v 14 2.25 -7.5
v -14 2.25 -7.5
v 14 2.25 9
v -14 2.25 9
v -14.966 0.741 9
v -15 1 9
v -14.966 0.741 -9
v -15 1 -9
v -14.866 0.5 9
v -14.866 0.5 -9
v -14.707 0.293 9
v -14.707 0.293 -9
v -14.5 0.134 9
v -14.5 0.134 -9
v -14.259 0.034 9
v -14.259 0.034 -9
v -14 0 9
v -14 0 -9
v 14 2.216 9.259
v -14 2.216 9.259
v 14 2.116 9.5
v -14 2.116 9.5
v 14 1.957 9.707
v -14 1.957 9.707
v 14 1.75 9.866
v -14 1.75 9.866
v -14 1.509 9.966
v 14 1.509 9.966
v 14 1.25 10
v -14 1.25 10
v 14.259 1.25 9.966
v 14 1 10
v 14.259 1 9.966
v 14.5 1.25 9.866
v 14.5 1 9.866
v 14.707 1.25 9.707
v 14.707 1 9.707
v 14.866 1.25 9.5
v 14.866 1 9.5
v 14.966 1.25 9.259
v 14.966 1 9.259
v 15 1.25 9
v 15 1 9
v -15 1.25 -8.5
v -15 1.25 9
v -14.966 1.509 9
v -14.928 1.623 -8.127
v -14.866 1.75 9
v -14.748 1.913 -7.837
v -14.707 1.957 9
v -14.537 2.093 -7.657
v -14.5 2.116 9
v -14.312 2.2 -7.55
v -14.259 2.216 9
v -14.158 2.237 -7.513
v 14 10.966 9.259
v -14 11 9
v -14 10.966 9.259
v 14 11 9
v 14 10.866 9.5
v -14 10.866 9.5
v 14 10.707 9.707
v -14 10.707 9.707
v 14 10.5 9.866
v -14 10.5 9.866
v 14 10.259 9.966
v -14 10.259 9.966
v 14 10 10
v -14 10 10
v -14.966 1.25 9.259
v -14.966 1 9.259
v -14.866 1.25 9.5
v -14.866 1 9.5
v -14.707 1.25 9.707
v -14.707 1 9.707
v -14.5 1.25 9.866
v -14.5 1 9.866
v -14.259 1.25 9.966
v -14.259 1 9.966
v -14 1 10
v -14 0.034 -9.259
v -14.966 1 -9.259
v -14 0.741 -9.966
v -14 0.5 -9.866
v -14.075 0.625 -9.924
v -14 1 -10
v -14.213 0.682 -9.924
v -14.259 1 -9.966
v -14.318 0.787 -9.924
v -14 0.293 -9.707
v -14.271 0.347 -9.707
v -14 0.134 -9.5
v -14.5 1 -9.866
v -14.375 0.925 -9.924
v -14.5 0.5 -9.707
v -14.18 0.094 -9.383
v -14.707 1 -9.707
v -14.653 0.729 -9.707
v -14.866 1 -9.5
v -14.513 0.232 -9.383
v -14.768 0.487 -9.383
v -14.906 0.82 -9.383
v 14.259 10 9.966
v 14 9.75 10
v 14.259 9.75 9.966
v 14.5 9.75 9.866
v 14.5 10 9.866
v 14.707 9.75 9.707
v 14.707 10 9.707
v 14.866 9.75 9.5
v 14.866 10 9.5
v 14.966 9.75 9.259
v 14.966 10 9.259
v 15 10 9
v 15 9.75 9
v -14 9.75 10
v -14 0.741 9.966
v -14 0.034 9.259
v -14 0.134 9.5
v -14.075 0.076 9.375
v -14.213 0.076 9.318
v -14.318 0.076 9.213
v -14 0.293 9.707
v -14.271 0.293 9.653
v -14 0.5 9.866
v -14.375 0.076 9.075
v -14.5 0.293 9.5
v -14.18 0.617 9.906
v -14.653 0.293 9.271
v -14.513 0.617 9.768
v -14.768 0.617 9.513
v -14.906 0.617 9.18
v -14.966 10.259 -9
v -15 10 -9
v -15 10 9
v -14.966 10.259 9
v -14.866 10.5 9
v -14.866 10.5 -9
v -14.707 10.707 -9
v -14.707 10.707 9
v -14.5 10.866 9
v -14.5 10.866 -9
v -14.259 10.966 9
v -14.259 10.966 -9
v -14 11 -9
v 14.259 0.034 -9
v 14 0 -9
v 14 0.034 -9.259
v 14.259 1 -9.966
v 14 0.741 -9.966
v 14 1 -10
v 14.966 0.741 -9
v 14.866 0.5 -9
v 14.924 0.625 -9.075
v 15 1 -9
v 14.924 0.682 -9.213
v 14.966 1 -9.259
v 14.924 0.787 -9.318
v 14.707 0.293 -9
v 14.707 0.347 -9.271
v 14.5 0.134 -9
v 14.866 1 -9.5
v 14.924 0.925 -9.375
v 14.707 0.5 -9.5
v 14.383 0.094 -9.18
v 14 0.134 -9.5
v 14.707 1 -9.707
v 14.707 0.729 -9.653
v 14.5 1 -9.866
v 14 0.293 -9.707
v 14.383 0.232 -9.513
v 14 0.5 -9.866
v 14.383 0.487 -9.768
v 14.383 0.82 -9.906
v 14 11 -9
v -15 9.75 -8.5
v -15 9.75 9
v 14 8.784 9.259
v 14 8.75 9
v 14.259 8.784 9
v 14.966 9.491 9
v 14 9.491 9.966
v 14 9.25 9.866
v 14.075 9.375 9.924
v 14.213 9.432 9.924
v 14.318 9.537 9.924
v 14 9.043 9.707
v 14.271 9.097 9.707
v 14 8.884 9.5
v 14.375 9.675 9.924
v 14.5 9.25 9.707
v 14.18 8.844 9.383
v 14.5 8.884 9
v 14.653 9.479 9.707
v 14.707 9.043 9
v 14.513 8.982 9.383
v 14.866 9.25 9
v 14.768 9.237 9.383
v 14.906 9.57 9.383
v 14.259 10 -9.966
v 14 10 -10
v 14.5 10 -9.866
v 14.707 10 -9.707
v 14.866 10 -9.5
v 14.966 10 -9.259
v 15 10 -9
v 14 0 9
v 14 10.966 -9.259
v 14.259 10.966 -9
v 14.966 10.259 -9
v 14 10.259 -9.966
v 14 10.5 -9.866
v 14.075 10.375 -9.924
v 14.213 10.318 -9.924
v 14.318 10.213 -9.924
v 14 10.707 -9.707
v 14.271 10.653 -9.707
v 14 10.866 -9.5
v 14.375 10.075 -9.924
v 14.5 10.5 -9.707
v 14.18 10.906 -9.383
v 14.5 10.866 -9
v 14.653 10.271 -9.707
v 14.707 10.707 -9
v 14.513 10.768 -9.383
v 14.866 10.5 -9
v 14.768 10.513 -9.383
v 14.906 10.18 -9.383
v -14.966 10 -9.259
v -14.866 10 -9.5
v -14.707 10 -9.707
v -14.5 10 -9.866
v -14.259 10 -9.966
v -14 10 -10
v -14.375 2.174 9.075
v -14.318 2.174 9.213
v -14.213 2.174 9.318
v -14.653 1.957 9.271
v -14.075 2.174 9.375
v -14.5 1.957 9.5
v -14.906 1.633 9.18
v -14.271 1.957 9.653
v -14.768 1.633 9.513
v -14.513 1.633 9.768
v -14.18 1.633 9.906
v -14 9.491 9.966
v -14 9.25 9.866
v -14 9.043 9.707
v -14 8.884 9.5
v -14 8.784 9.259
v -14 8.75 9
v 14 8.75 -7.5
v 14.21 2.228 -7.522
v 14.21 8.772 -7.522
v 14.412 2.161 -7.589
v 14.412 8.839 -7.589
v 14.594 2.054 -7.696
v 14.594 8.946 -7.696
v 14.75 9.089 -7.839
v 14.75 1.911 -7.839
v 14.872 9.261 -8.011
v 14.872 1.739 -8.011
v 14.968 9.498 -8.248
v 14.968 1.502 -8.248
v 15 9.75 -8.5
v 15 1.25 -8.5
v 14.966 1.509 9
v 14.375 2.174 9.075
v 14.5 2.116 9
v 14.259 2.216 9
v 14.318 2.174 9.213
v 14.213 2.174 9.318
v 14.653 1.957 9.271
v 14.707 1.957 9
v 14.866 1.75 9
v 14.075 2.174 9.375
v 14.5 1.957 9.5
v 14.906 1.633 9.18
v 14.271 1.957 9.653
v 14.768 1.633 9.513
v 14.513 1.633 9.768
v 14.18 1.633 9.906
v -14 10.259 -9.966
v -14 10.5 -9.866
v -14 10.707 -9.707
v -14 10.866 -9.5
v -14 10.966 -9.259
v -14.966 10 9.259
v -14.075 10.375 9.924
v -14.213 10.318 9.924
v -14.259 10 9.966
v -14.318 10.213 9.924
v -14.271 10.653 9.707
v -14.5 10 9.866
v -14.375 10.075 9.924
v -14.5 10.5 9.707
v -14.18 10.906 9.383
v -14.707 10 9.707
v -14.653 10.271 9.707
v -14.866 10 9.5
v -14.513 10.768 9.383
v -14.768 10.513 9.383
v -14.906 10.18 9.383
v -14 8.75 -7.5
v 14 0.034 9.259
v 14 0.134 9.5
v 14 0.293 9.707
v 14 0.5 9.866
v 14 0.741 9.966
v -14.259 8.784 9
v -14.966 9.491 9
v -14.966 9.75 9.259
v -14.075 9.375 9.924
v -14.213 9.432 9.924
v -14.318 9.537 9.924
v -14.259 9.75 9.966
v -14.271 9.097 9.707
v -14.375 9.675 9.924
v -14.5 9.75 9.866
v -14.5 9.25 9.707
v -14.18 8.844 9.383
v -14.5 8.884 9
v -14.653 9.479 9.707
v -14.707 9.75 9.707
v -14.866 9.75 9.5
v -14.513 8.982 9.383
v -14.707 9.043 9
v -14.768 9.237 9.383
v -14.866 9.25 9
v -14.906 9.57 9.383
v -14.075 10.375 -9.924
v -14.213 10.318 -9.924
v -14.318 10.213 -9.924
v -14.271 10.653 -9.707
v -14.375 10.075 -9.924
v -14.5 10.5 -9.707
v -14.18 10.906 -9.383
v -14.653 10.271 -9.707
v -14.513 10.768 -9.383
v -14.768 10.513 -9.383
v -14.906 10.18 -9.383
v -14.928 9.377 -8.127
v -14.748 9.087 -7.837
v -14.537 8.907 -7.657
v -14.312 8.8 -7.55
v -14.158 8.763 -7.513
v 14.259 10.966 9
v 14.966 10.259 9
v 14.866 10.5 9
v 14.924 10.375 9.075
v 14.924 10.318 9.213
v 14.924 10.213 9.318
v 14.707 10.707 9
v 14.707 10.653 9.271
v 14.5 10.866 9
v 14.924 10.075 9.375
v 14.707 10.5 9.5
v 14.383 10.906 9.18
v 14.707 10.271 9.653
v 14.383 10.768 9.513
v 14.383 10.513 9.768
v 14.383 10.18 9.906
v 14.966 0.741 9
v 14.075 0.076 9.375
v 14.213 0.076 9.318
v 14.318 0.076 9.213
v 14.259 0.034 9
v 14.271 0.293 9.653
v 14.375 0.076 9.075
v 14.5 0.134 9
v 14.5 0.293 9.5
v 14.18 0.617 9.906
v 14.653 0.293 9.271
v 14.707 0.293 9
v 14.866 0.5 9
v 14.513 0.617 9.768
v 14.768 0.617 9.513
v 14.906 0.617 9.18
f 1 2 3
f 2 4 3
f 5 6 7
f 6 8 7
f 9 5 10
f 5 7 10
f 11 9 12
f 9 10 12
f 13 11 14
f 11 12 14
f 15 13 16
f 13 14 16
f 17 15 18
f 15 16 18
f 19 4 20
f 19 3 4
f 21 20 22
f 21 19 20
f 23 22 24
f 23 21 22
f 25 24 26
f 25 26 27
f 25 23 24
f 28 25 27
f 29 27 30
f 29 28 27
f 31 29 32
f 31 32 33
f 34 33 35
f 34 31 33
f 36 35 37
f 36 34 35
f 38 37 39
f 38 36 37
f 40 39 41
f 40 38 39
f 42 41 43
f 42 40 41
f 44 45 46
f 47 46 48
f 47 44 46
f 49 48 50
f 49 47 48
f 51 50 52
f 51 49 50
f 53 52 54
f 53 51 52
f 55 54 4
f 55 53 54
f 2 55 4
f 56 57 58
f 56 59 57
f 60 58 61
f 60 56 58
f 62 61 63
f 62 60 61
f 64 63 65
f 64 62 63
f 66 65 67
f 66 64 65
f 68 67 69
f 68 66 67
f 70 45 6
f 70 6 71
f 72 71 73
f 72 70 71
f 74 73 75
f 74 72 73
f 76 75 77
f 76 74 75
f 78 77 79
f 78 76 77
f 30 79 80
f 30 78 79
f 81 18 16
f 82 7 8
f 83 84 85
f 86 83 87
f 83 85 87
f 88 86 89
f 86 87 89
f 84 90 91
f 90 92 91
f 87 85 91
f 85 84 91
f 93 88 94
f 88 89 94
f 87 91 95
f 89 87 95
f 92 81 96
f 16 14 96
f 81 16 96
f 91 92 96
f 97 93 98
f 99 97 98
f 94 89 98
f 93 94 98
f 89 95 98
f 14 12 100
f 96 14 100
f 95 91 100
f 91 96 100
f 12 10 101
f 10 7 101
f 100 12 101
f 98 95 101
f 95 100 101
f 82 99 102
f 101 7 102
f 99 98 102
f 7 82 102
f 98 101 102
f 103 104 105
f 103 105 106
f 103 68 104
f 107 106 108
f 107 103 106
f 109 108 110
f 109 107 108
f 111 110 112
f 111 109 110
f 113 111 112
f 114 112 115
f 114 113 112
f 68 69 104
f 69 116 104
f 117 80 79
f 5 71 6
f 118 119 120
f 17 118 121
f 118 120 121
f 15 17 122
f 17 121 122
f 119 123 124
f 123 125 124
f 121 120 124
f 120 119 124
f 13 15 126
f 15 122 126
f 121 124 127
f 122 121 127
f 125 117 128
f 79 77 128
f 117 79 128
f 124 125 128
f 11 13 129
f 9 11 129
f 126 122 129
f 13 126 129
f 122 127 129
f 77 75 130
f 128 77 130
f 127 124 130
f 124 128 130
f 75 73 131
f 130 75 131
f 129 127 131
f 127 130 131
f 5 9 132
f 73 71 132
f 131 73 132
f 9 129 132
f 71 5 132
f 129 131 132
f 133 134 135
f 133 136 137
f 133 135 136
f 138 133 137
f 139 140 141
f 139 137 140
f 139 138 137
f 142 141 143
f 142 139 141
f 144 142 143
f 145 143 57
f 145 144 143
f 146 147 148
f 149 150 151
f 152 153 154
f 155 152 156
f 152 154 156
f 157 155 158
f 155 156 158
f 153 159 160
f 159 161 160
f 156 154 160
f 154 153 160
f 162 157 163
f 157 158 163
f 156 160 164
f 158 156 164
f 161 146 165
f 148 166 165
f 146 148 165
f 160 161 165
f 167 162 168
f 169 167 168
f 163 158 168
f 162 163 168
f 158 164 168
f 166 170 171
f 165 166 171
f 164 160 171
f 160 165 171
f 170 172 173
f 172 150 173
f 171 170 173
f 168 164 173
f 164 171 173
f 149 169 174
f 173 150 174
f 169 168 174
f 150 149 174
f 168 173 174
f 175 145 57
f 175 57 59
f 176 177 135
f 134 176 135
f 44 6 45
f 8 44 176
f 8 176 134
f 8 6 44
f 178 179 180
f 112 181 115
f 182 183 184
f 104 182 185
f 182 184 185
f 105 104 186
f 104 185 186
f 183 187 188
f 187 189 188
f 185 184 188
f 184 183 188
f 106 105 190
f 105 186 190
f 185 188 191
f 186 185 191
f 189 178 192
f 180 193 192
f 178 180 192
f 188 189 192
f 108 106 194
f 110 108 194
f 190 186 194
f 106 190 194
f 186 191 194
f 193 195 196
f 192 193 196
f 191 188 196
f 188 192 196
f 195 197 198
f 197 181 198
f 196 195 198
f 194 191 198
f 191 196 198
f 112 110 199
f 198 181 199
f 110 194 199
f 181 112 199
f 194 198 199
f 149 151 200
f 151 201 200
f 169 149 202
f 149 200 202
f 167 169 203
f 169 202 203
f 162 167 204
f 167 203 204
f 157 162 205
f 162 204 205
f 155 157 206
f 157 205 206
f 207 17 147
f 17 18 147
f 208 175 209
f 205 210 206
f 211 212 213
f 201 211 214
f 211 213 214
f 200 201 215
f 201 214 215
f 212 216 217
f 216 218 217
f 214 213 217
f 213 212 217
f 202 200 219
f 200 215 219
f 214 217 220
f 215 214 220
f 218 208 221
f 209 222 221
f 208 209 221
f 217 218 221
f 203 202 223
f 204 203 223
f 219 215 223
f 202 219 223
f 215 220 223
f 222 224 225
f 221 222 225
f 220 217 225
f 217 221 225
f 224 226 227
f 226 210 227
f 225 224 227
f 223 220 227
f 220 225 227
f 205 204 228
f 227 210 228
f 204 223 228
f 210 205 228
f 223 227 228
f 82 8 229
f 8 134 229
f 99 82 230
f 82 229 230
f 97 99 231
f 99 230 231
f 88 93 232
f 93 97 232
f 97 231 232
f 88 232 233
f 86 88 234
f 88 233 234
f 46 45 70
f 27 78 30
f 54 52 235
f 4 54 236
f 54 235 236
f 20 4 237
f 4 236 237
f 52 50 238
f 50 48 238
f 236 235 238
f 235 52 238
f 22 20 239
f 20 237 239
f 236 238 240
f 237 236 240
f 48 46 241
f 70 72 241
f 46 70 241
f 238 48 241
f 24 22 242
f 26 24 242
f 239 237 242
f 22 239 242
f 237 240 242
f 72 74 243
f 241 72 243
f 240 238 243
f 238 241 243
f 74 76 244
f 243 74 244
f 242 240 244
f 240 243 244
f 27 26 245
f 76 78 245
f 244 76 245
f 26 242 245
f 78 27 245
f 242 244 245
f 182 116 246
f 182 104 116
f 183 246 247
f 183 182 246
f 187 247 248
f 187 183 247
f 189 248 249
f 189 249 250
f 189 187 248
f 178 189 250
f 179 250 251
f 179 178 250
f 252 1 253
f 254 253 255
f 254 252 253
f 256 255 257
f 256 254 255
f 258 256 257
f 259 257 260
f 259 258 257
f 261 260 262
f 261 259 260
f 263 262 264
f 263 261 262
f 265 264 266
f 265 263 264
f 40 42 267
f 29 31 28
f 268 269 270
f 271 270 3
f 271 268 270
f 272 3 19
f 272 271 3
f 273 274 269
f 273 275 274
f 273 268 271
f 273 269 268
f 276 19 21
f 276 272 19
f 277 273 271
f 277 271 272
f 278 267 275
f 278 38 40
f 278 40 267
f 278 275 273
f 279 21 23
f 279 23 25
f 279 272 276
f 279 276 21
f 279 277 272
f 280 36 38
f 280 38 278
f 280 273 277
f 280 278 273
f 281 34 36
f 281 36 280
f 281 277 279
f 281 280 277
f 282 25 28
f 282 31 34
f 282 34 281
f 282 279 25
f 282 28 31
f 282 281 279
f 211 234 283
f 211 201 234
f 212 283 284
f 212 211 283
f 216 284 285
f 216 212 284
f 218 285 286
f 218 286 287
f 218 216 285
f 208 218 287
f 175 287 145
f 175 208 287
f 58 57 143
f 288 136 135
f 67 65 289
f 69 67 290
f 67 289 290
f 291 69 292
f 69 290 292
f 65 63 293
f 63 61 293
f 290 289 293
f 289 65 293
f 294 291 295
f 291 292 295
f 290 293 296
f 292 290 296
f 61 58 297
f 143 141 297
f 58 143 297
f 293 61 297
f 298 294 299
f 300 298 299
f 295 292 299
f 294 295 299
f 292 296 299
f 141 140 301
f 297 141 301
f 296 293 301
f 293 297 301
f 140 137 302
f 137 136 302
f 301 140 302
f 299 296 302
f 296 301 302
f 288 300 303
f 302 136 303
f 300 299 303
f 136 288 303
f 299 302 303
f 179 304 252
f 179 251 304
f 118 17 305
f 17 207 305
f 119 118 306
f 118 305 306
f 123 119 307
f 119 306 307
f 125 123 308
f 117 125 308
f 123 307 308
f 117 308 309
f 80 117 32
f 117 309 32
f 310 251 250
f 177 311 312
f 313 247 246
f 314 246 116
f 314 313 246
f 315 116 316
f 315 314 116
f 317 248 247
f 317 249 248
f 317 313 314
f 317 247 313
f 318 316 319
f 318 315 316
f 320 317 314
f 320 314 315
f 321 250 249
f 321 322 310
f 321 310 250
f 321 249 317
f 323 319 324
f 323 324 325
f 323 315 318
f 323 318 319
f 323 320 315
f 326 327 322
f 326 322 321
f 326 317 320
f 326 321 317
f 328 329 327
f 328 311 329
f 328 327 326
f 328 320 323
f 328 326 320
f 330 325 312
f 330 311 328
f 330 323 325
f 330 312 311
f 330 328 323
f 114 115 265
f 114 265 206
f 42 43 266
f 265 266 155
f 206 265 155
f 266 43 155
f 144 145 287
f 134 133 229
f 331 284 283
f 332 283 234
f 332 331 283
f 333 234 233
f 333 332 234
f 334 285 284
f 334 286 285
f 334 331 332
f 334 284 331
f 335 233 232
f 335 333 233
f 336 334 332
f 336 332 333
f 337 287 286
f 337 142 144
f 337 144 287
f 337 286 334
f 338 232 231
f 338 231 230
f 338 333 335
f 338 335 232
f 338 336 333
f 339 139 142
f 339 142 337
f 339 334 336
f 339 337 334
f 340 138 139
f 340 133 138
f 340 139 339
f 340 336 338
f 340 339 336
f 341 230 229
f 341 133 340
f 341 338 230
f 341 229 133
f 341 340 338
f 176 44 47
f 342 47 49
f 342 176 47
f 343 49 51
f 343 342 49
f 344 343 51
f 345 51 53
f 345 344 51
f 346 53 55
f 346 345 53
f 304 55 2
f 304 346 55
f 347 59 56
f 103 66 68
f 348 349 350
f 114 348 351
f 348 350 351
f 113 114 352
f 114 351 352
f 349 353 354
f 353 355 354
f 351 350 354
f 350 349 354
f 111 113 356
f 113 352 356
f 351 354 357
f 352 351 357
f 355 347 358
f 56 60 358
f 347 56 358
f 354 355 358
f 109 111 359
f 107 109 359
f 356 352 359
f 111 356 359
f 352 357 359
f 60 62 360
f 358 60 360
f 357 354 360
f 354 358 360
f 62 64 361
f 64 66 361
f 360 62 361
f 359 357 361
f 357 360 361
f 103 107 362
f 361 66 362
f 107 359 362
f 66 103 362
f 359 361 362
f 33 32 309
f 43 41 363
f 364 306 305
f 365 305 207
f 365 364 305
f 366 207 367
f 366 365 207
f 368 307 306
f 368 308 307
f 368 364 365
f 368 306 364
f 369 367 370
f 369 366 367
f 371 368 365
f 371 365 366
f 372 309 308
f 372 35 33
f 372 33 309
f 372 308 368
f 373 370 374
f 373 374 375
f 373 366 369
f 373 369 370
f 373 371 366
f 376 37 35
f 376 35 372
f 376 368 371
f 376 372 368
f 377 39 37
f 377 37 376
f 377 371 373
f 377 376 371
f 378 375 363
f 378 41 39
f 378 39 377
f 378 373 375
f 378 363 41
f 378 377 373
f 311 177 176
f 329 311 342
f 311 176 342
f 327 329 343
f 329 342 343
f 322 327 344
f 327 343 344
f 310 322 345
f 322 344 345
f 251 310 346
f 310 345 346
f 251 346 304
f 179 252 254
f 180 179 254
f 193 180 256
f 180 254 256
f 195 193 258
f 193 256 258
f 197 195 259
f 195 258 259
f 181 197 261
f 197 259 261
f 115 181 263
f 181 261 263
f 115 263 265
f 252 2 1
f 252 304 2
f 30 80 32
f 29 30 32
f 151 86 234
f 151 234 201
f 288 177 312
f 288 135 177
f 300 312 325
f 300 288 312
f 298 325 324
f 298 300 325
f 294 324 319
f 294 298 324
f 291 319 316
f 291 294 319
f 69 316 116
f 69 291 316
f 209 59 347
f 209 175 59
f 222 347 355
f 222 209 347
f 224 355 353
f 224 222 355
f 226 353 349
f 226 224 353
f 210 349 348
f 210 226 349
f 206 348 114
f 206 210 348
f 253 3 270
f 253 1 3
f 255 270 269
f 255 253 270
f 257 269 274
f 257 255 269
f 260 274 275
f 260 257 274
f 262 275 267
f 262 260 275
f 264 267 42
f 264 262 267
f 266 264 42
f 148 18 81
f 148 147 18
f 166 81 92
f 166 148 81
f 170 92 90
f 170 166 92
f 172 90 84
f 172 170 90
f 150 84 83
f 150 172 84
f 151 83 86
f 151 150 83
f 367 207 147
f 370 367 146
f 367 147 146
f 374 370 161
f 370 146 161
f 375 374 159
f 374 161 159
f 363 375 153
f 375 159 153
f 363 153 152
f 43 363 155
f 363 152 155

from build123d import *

# Parameters (mm, degrees)
SKETCH1_W           = 30
SKETCH1_H           = 20
BOSS_EXTRUDE1_DEPTH = 11
SKETCH2_W           = 30
SKETCH2_H           = 6.5
CUT_EXTRUDE1_DEPTH  = 17.5
FILLET1_R           = 1


with BuildPart() as part:
    # Sketch1 → Boss-Extrude1 (new body)
    with BuildSketch(Plane(origin=(0, 0, 0), x_dir=(1, 0, 0), z_dir=(0, 1, 0))):
        Rectangle(SKETCH1_W, SKETCH1_H)
    extrude(amount=BOSS_EXTRUDE1_DEPTH)

    # Sketch2 → Cut-Extrude1 (cut)
    with BuildSketch(Plane.XY.offset(10)):
        with Locations((0, 5.5)):
            Rectangle(SKETCH2_W, SKETCH2_H)
    extrude(amount=-CUT_EXTRUDE1_DEPTH, mode=Mode.SUBTRACT)

    # Fillet1
    fillet1_edges = [part.edges().sort_by_distance(p)[0] for p in [
        (-15, 11, 0),
        (0, 11, 10),
        (15, 1.125, 10),
        (-15, 1.125, 10),
        (-15, 8.75, 1.25),
        (15, 5.5, -7.5),
        (15, 8.75, 1.25),
        (15, 2.25, 1.25),
        (-15, 5.5, -7.5),
        (-15, 2.25, 1.25),
        (0, 8.75, 10),
        (0, 2.25, 10),
        (15, 11, 0),
        (0, 0, 10),
        (-15, 0, 0),
        (0, 0, -10),
        (15, 0, 0),
        (0, 11, -10),
        (15, 9.875, 10),
        (-15, 9.875, 10),
        (-15, 5.5, -10),
        (15, 5.5, -10),
    ]]
    fillet(fillet1_edges, radius=FILLET1_R)


solid = part.part
